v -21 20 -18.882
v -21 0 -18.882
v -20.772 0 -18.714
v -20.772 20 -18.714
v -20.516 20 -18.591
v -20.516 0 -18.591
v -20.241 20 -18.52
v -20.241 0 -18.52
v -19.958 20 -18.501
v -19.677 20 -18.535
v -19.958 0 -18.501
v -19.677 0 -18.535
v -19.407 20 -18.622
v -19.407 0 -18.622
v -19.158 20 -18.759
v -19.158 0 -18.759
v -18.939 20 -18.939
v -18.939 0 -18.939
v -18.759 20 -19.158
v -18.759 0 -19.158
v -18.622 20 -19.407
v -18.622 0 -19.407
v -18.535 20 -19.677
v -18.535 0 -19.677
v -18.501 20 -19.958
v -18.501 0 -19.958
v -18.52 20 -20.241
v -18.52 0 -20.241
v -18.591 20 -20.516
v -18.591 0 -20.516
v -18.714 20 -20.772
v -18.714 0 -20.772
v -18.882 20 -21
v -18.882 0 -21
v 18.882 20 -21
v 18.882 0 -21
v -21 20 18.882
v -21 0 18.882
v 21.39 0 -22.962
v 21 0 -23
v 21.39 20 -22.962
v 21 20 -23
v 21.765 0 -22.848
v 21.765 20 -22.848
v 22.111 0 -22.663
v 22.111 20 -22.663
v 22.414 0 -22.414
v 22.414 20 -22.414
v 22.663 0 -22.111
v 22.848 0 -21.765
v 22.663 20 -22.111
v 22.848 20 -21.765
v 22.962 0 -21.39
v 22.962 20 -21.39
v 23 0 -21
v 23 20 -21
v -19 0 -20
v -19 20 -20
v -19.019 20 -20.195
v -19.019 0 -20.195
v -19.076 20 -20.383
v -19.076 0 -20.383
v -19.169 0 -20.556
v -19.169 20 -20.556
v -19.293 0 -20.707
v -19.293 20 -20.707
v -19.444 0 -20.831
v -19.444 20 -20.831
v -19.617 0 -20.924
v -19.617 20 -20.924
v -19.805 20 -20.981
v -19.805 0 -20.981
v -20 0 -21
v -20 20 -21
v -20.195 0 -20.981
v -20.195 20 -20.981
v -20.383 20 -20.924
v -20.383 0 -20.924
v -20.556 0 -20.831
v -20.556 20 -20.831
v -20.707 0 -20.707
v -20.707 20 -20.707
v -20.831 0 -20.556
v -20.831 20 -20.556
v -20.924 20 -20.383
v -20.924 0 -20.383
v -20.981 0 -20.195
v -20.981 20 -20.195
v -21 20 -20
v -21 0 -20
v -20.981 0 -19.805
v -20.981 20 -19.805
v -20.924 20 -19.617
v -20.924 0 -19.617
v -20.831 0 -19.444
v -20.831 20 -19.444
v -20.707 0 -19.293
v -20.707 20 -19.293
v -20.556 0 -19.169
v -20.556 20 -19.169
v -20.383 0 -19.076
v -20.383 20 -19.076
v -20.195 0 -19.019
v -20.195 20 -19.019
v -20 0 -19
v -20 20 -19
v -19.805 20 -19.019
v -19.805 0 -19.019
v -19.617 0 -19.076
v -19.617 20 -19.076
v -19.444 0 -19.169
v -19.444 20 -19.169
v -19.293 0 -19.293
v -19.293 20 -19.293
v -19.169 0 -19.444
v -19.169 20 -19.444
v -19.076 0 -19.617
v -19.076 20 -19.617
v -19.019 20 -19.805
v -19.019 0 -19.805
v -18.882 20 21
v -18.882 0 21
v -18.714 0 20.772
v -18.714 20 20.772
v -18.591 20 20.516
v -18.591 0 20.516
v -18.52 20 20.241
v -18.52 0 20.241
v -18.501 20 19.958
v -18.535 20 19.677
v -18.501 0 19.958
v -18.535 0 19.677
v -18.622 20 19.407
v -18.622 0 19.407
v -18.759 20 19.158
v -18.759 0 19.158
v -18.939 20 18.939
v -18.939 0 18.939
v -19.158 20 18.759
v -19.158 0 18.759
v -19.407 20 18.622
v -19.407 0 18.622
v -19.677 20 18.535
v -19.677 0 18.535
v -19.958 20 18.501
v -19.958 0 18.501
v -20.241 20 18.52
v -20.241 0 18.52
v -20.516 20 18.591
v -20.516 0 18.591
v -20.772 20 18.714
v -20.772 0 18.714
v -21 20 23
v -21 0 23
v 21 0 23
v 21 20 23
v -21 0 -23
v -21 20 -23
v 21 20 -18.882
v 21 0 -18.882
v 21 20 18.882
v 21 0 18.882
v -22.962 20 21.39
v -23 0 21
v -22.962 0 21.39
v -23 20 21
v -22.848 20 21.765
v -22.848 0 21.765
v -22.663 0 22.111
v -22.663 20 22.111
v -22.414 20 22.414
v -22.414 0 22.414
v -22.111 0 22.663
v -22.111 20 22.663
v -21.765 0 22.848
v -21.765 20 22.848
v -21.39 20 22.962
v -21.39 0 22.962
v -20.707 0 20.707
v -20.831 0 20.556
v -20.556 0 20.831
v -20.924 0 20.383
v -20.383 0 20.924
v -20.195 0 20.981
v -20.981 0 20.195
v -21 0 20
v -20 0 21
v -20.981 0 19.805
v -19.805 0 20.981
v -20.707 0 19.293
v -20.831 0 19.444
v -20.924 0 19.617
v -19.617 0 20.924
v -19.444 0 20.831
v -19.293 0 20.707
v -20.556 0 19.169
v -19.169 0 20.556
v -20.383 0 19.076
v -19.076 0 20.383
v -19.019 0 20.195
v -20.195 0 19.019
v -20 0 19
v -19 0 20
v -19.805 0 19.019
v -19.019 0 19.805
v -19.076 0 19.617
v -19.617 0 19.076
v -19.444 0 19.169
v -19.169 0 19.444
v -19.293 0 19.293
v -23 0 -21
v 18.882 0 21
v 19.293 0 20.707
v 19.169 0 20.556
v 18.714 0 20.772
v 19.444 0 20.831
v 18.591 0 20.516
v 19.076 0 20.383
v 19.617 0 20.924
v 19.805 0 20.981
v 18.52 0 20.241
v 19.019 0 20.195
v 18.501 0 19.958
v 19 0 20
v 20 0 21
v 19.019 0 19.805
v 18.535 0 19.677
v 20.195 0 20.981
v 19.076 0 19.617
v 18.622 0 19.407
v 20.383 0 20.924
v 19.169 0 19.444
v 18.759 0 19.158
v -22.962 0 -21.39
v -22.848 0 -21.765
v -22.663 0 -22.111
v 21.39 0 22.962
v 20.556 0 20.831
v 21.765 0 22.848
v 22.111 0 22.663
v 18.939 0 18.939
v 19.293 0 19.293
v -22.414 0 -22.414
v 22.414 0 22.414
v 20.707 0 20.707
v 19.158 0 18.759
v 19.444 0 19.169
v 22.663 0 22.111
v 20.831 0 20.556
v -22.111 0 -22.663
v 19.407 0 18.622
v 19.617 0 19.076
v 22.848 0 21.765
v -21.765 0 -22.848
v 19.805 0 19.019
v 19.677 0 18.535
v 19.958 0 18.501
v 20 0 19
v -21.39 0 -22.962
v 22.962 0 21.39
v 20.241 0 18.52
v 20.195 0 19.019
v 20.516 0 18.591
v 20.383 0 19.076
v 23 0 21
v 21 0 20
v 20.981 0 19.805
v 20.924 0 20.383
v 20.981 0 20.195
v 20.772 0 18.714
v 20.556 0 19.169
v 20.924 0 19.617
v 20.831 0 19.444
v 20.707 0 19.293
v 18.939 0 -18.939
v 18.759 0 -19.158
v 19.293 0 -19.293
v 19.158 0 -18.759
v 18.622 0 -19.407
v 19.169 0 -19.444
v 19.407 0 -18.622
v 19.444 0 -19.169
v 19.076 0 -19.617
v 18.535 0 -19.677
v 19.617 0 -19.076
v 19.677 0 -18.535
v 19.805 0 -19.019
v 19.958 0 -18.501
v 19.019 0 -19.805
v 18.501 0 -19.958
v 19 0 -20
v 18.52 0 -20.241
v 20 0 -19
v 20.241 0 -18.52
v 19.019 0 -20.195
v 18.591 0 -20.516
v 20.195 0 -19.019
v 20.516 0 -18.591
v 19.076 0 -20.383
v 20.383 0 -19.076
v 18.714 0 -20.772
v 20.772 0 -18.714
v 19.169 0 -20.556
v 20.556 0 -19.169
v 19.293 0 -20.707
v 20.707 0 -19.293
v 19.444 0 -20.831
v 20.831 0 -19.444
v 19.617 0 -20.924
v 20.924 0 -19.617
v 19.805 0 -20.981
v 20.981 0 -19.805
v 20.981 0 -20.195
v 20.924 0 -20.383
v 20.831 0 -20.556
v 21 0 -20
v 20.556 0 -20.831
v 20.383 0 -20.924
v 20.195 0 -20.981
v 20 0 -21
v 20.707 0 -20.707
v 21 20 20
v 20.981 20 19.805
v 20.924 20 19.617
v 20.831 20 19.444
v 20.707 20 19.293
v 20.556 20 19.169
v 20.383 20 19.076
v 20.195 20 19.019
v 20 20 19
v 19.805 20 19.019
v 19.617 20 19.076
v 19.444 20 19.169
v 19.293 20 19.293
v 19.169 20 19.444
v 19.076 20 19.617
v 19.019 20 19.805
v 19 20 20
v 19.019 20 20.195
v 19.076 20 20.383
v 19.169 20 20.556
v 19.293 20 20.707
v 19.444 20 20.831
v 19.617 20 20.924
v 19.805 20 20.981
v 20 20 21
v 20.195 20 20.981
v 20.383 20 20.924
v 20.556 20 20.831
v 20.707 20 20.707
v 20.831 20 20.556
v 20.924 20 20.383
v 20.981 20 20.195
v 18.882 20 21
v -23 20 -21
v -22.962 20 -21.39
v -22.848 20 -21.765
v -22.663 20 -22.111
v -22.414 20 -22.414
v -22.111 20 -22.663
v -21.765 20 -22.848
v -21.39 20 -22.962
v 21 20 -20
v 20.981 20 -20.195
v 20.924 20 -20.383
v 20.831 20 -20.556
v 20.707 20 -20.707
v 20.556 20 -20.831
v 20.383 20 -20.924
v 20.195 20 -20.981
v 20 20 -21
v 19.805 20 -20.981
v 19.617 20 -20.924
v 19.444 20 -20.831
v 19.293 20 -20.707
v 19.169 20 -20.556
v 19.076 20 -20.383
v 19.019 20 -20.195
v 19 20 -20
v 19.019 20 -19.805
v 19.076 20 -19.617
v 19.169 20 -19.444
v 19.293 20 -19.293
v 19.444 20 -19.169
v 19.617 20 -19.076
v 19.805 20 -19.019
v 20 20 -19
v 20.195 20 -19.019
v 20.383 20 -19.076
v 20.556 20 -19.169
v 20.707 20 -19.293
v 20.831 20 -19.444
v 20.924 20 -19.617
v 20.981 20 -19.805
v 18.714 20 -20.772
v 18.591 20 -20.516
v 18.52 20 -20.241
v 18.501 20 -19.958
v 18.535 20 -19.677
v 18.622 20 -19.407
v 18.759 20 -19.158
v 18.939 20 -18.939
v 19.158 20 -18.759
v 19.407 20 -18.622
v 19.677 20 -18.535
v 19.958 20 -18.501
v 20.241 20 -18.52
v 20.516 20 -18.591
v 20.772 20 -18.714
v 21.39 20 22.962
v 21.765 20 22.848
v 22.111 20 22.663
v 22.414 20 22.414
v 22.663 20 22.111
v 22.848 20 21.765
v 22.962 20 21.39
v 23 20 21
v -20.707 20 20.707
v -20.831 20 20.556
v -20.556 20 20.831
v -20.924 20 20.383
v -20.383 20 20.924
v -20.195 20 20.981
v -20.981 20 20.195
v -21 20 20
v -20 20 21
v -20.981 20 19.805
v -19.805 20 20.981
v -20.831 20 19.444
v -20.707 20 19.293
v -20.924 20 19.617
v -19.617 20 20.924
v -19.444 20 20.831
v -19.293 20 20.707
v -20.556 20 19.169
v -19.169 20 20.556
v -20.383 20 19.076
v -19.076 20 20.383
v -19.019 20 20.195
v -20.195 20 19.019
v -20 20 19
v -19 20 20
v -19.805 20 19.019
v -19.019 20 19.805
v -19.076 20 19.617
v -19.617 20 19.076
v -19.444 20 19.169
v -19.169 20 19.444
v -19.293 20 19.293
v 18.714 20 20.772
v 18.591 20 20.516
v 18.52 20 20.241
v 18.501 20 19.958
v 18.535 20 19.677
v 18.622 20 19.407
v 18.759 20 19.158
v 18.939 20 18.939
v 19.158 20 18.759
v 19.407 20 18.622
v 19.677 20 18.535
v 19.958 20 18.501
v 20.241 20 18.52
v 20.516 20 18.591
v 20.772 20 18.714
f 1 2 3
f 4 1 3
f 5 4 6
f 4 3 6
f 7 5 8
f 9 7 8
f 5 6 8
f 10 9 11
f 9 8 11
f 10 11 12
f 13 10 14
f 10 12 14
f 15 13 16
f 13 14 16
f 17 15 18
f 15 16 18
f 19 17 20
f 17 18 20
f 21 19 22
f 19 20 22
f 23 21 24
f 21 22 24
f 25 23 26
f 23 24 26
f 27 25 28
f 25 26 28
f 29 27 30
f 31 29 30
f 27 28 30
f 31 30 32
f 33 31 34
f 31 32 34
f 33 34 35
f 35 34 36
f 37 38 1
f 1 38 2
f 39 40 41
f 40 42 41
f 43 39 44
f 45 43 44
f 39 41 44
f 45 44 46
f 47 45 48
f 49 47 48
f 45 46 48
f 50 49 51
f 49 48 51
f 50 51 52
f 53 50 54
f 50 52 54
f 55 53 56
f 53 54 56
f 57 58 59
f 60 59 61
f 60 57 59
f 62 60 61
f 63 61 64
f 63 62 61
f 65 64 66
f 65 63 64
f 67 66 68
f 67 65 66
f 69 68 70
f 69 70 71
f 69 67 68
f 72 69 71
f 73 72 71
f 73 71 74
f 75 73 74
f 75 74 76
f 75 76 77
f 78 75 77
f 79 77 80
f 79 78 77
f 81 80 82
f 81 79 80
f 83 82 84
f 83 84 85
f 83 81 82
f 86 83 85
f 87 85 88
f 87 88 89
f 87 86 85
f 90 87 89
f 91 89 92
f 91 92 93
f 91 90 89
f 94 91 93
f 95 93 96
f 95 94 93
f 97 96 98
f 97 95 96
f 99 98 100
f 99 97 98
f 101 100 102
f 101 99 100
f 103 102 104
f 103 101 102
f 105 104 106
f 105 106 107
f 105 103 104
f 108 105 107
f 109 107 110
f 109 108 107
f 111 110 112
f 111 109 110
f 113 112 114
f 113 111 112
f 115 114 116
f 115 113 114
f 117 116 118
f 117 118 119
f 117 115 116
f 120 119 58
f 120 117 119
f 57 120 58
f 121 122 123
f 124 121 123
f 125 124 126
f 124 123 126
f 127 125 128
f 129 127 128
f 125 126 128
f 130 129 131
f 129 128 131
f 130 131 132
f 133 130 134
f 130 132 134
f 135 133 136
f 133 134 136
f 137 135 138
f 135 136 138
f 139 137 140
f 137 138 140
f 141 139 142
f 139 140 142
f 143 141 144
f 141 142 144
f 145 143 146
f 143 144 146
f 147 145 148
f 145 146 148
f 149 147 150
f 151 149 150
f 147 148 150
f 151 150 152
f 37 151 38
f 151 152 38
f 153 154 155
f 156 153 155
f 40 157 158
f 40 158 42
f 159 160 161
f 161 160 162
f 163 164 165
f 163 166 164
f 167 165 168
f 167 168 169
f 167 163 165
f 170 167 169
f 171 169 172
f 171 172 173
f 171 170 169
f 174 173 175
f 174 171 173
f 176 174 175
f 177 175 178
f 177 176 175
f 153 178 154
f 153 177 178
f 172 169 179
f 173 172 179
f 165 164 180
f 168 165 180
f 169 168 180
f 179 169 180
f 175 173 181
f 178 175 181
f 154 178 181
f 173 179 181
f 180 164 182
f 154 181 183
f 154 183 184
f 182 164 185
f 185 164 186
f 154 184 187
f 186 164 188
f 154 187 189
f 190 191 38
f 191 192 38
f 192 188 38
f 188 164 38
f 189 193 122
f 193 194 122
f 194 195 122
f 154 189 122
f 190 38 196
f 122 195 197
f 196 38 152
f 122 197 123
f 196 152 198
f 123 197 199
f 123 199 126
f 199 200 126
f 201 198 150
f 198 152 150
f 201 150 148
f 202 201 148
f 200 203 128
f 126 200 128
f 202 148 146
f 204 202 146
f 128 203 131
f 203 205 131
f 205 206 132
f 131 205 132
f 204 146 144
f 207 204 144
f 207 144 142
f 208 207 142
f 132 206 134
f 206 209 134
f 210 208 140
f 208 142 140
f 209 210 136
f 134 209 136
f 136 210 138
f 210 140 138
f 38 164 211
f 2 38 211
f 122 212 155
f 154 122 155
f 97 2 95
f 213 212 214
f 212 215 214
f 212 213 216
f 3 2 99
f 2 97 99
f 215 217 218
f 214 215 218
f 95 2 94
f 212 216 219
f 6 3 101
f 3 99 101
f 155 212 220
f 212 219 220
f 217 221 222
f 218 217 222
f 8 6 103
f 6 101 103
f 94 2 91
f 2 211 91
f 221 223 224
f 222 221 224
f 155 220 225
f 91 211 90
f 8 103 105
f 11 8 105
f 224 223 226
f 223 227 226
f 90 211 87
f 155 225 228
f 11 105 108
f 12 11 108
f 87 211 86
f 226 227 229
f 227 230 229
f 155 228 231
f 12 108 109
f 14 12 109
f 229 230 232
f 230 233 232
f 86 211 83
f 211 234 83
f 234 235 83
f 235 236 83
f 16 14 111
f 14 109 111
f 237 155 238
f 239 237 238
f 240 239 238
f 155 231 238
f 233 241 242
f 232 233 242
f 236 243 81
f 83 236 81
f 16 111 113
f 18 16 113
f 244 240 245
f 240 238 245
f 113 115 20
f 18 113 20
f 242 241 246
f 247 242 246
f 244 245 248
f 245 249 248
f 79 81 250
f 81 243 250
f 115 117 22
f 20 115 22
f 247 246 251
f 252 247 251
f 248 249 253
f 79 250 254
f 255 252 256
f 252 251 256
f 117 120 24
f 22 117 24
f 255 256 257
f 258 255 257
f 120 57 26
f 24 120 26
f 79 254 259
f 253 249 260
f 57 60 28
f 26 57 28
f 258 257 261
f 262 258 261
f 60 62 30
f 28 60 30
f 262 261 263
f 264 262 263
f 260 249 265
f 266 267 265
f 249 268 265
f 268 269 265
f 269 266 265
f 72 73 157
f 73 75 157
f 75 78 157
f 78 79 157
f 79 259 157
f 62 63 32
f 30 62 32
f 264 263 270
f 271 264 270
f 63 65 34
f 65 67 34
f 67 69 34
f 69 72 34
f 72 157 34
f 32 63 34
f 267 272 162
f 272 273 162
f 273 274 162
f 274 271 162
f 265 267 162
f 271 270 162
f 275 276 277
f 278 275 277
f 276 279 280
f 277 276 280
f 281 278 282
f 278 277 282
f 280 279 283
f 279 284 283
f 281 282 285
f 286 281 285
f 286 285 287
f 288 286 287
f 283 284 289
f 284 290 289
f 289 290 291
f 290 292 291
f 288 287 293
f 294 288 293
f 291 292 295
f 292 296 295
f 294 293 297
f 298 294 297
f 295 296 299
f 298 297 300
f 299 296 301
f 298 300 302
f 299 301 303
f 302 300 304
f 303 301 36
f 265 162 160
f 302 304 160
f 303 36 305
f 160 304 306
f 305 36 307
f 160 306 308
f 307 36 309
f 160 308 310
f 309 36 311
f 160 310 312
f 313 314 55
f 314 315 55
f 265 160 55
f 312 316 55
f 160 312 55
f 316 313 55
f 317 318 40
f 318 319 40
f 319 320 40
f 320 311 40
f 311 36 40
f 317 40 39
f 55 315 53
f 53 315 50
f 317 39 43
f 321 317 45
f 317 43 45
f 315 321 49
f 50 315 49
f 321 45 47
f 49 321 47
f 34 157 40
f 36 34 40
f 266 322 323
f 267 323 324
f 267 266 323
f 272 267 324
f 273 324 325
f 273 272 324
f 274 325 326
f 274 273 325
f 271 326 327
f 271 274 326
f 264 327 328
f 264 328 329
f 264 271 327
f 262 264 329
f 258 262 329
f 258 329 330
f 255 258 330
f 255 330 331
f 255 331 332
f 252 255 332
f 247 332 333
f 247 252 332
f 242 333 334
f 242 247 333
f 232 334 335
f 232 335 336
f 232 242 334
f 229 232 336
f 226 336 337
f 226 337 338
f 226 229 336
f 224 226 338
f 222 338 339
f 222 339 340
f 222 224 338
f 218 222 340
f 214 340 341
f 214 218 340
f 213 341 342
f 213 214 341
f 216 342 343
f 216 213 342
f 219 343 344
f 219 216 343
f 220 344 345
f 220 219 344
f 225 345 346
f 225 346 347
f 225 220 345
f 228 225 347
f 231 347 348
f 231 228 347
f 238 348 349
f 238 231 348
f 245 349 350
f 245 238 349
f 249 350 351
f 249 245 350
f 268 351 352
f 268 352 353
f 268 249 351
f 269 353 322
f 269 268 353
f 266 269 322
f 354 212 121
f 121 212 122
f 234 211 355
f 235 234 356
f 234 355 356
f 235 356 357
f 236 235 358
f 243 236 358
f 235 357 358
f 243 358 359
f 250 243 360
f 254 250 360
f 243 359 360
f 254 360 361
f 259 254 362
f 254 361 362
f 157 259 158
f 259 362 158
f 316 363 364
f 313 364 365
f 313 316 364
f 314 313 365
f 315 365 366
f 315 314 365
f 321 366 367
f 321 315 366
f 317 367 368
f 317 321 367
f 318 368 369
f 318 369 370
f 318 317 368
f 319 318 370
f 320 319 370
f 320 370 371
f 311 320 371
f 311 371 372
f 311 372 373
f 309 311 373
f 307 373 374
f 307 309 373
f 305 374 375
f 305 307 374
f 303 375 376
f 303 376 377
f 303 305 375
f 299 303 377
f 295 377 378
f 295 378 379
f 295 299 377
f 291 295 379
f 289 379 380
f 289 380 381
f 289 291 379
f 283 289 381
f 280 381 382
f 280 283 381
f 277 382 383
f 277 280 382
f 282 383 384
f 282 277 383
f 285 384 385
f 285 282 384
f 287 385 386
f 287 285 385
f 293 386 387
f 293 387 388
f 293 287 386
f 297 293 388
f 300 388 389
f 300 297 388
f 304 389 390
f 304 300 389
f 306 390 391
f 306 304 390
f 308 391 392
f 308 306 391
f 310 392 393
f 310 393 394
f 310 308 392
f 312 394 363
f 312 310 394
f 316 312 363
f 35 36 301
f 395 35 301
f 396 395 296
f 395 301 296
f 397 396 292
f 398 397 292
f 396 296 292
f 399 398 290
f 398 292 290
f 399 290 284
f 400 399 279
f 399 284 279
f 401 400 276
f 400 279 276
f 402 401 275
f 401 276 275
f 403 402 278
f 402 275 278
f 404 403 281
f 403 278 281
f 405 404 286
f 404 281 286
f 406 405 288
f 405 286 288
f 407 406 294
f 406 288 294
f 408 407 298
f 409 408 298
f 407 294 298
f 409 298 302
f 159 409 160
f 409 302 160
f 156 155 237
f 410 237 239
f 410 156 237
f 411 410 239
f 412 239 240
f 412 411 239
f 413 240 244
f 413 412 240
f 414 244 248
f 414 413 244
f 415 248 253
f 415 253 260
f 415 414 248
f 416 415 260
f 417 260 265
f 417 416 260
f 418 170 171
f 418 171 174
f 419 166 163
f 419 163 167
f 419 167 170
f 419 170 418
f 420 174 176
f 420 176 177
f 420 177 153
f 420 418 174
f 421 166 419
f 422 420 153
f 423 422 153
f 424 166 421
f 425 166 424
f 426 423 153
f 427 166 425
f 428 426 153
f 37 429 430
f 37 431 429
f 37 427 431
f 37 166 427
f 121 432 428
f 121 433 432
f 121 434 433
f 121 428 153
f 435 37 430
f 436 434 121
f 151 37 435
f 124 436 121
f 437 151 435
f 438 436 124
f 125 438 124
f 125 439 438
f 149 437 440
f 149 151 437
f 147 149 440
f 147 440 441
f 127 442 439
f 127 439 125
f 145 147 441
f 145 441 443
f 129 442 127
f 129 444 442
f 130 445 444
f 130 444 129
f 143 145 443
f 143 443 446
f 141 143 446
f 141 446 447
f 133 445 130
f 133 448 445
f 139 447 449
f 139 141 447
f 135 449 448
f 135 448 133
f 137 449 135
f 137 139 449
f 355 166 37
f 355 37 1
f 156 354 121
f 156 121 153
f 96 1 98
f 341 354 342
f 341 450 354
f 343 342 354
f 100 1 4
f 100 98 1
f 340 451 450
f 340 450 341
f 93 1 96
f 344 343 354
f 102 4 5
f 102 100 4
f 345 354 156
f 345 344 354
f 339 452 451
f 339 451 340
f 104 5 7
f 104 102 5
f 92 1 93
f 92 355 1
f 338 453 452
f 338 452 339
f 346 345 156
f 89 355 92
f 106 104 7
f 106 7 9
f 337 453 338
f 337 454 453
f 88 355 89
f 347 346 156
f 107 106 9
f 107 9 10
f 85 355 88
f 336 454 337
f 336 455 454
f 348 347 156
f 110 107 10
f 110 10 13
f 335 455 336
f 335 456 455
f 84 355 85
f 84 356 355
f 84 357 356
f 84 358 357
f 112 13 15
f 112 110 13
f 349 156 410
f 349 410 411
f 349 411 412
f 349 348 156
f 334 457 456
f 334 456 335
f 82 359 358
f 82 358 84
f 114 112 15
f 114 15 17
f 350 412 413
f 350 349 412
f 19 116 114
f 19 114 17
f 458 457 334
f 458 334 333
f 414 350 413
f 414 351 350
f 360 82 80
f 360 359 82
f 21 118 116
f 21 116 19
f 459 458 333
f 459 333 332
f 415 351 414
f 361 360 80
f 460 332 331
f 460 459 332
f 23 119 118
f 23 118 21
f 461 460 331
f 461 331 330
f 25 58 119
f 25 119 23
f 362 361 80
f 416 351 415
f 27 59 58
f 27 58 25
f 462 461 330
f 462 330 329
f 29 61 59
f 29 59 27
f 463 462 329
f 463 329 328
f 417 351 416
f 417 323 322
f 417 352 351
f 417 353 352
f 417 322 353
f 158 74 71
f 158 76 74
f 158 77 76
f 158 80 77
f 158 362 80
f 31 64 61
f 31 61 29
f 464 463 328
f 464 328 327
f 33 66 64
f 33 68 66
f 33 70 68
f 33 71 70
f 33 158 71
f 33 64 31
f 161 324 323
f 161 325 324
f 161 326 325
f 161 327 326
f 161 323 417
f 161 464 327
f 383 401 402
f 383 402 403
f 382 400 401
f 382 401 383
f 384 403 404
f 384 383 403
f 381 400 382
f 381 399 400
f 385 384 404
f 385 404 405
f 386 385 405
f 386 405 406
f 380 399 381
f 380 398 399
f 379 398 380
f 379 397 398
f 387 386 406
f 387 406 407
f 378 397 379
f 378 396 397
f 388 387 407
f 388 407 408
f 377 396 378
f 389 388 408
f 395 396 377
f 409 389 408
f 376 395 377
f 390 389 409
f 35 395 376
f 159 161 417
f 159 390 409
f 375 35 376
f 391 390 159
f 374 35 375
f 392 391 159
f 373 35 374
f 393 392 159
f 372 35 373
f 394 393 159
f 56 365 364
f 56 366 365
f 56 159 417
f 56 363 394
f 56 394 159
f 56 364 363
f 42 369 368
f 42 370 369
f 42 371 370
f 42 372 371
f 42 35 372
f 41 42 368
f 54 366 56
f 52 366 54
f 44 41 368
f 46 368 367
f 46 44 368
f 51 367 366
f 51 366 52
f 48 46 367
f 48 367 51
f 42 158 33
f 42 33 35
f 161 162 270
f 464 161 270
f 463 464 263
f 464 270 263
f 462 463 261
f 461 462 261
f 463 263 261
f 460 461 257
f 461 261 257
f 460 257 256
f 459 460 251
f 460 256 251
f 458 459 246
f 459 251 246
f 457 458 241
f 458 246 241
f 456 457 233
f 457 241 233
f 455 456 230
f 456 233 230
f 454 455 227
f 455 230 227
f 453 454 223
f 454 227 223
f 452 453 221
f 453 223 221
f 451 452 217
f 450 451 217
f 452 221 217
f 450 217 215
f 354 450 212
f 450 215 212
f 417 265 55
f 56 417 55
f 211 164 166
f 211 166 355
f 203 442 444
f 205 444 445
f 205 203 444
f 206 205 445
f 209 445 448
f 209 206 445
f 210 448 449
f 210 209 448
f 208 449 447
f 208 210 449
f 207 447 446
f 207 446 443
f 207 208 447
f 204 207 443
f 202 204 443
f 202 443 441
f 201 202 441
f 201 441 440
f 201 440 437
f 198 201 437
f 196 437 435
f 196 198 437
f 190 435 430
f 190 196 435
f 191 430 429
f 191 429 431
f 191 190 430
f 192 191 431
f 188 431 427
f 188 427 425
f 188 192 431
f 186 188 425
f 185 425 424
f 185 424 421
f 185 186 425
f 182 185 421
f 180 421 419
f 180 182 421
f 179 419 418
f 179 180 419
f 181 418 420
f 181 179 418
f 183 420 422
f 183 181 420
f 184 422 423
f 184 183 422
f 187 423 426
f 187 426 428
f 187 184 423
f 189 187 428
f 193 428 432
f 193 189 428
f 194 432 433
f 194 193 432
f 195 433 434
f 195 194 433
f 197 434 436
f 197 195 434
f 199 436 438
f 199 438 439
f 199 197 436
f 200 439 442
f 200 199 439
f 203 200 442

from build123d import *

# Parameters (mm, degrees)
SKETCH1_W           = 46
SKETCH1_H           = 46
SKETCH1_R           = 1
BOSS_EXTRUDE1_DEPTH = 20
FILLET1_R           = 2


with BuildPart() as part:
    # Sketch1 → Boss-Extrude1 (new body)
    with BuildSketch(Plane(origin=(0, 0, 0), x_dir=(1, 0, 0), z_dir=(0, 1, 0))):
        Rectangle(SKETCH1_W, SKETCH1_H)
        with Locations((-20, 20)):
            Circle(SKETCH1_R, mode=Mode.SUBTRACT)
        with Locations((20, 20)):
            Circle(SKETCH1_R, mode=Mode.SUBTRACT)
        with Locations((20, -20)):
            Circle(SKETCH1_R, mode=Mode.SUBTRACT)
        with Locations((-20, -20)):
            Circle(SKETCH1_R, mode=Mode.SUBTRACT)
        with BuildLine():
            Line((-18.881966011, 21), (18.881966011, 21))
            ThreePointArc((18.881966011, 21), (18.939339828, 18.939339828), (21, 18.881966011))
            Line((21, 18.881966011), (21, -18.881966011))
            ThreePointArc((21, -18.881966011), (18.939339828, -18.939339828), (18.881966011, -21))
            Line((18.881966011, -21), (-18.881966011, -21))
            ThreePointArc((-18.881966011, -21), (-18.939339828, -18.939339828), (-21, -18.881966011))
            Line((-21, -18.881966011), (-21, 18.881966011))
            ThreePointArc((-21, 18.881966011), (-18.939339828, 18.939339828), (-18.881966011, 21))
        make_face(mode=Mode.SUBTRACT)
    extrude(amount=BOSS_EXTRUDE1_DEPTH)

    # Fillet1
    fillet1_edges = [part.edges().sort_by_distance(p)[0] for p in [
        (23, 10, 23),
        (-23, 10, 23),
        (-23, 10, -23),
        (23, 10, -23),
    ]]
    fillet(fillet1_edges, radius=FILLET1_R)


solid = part.part
